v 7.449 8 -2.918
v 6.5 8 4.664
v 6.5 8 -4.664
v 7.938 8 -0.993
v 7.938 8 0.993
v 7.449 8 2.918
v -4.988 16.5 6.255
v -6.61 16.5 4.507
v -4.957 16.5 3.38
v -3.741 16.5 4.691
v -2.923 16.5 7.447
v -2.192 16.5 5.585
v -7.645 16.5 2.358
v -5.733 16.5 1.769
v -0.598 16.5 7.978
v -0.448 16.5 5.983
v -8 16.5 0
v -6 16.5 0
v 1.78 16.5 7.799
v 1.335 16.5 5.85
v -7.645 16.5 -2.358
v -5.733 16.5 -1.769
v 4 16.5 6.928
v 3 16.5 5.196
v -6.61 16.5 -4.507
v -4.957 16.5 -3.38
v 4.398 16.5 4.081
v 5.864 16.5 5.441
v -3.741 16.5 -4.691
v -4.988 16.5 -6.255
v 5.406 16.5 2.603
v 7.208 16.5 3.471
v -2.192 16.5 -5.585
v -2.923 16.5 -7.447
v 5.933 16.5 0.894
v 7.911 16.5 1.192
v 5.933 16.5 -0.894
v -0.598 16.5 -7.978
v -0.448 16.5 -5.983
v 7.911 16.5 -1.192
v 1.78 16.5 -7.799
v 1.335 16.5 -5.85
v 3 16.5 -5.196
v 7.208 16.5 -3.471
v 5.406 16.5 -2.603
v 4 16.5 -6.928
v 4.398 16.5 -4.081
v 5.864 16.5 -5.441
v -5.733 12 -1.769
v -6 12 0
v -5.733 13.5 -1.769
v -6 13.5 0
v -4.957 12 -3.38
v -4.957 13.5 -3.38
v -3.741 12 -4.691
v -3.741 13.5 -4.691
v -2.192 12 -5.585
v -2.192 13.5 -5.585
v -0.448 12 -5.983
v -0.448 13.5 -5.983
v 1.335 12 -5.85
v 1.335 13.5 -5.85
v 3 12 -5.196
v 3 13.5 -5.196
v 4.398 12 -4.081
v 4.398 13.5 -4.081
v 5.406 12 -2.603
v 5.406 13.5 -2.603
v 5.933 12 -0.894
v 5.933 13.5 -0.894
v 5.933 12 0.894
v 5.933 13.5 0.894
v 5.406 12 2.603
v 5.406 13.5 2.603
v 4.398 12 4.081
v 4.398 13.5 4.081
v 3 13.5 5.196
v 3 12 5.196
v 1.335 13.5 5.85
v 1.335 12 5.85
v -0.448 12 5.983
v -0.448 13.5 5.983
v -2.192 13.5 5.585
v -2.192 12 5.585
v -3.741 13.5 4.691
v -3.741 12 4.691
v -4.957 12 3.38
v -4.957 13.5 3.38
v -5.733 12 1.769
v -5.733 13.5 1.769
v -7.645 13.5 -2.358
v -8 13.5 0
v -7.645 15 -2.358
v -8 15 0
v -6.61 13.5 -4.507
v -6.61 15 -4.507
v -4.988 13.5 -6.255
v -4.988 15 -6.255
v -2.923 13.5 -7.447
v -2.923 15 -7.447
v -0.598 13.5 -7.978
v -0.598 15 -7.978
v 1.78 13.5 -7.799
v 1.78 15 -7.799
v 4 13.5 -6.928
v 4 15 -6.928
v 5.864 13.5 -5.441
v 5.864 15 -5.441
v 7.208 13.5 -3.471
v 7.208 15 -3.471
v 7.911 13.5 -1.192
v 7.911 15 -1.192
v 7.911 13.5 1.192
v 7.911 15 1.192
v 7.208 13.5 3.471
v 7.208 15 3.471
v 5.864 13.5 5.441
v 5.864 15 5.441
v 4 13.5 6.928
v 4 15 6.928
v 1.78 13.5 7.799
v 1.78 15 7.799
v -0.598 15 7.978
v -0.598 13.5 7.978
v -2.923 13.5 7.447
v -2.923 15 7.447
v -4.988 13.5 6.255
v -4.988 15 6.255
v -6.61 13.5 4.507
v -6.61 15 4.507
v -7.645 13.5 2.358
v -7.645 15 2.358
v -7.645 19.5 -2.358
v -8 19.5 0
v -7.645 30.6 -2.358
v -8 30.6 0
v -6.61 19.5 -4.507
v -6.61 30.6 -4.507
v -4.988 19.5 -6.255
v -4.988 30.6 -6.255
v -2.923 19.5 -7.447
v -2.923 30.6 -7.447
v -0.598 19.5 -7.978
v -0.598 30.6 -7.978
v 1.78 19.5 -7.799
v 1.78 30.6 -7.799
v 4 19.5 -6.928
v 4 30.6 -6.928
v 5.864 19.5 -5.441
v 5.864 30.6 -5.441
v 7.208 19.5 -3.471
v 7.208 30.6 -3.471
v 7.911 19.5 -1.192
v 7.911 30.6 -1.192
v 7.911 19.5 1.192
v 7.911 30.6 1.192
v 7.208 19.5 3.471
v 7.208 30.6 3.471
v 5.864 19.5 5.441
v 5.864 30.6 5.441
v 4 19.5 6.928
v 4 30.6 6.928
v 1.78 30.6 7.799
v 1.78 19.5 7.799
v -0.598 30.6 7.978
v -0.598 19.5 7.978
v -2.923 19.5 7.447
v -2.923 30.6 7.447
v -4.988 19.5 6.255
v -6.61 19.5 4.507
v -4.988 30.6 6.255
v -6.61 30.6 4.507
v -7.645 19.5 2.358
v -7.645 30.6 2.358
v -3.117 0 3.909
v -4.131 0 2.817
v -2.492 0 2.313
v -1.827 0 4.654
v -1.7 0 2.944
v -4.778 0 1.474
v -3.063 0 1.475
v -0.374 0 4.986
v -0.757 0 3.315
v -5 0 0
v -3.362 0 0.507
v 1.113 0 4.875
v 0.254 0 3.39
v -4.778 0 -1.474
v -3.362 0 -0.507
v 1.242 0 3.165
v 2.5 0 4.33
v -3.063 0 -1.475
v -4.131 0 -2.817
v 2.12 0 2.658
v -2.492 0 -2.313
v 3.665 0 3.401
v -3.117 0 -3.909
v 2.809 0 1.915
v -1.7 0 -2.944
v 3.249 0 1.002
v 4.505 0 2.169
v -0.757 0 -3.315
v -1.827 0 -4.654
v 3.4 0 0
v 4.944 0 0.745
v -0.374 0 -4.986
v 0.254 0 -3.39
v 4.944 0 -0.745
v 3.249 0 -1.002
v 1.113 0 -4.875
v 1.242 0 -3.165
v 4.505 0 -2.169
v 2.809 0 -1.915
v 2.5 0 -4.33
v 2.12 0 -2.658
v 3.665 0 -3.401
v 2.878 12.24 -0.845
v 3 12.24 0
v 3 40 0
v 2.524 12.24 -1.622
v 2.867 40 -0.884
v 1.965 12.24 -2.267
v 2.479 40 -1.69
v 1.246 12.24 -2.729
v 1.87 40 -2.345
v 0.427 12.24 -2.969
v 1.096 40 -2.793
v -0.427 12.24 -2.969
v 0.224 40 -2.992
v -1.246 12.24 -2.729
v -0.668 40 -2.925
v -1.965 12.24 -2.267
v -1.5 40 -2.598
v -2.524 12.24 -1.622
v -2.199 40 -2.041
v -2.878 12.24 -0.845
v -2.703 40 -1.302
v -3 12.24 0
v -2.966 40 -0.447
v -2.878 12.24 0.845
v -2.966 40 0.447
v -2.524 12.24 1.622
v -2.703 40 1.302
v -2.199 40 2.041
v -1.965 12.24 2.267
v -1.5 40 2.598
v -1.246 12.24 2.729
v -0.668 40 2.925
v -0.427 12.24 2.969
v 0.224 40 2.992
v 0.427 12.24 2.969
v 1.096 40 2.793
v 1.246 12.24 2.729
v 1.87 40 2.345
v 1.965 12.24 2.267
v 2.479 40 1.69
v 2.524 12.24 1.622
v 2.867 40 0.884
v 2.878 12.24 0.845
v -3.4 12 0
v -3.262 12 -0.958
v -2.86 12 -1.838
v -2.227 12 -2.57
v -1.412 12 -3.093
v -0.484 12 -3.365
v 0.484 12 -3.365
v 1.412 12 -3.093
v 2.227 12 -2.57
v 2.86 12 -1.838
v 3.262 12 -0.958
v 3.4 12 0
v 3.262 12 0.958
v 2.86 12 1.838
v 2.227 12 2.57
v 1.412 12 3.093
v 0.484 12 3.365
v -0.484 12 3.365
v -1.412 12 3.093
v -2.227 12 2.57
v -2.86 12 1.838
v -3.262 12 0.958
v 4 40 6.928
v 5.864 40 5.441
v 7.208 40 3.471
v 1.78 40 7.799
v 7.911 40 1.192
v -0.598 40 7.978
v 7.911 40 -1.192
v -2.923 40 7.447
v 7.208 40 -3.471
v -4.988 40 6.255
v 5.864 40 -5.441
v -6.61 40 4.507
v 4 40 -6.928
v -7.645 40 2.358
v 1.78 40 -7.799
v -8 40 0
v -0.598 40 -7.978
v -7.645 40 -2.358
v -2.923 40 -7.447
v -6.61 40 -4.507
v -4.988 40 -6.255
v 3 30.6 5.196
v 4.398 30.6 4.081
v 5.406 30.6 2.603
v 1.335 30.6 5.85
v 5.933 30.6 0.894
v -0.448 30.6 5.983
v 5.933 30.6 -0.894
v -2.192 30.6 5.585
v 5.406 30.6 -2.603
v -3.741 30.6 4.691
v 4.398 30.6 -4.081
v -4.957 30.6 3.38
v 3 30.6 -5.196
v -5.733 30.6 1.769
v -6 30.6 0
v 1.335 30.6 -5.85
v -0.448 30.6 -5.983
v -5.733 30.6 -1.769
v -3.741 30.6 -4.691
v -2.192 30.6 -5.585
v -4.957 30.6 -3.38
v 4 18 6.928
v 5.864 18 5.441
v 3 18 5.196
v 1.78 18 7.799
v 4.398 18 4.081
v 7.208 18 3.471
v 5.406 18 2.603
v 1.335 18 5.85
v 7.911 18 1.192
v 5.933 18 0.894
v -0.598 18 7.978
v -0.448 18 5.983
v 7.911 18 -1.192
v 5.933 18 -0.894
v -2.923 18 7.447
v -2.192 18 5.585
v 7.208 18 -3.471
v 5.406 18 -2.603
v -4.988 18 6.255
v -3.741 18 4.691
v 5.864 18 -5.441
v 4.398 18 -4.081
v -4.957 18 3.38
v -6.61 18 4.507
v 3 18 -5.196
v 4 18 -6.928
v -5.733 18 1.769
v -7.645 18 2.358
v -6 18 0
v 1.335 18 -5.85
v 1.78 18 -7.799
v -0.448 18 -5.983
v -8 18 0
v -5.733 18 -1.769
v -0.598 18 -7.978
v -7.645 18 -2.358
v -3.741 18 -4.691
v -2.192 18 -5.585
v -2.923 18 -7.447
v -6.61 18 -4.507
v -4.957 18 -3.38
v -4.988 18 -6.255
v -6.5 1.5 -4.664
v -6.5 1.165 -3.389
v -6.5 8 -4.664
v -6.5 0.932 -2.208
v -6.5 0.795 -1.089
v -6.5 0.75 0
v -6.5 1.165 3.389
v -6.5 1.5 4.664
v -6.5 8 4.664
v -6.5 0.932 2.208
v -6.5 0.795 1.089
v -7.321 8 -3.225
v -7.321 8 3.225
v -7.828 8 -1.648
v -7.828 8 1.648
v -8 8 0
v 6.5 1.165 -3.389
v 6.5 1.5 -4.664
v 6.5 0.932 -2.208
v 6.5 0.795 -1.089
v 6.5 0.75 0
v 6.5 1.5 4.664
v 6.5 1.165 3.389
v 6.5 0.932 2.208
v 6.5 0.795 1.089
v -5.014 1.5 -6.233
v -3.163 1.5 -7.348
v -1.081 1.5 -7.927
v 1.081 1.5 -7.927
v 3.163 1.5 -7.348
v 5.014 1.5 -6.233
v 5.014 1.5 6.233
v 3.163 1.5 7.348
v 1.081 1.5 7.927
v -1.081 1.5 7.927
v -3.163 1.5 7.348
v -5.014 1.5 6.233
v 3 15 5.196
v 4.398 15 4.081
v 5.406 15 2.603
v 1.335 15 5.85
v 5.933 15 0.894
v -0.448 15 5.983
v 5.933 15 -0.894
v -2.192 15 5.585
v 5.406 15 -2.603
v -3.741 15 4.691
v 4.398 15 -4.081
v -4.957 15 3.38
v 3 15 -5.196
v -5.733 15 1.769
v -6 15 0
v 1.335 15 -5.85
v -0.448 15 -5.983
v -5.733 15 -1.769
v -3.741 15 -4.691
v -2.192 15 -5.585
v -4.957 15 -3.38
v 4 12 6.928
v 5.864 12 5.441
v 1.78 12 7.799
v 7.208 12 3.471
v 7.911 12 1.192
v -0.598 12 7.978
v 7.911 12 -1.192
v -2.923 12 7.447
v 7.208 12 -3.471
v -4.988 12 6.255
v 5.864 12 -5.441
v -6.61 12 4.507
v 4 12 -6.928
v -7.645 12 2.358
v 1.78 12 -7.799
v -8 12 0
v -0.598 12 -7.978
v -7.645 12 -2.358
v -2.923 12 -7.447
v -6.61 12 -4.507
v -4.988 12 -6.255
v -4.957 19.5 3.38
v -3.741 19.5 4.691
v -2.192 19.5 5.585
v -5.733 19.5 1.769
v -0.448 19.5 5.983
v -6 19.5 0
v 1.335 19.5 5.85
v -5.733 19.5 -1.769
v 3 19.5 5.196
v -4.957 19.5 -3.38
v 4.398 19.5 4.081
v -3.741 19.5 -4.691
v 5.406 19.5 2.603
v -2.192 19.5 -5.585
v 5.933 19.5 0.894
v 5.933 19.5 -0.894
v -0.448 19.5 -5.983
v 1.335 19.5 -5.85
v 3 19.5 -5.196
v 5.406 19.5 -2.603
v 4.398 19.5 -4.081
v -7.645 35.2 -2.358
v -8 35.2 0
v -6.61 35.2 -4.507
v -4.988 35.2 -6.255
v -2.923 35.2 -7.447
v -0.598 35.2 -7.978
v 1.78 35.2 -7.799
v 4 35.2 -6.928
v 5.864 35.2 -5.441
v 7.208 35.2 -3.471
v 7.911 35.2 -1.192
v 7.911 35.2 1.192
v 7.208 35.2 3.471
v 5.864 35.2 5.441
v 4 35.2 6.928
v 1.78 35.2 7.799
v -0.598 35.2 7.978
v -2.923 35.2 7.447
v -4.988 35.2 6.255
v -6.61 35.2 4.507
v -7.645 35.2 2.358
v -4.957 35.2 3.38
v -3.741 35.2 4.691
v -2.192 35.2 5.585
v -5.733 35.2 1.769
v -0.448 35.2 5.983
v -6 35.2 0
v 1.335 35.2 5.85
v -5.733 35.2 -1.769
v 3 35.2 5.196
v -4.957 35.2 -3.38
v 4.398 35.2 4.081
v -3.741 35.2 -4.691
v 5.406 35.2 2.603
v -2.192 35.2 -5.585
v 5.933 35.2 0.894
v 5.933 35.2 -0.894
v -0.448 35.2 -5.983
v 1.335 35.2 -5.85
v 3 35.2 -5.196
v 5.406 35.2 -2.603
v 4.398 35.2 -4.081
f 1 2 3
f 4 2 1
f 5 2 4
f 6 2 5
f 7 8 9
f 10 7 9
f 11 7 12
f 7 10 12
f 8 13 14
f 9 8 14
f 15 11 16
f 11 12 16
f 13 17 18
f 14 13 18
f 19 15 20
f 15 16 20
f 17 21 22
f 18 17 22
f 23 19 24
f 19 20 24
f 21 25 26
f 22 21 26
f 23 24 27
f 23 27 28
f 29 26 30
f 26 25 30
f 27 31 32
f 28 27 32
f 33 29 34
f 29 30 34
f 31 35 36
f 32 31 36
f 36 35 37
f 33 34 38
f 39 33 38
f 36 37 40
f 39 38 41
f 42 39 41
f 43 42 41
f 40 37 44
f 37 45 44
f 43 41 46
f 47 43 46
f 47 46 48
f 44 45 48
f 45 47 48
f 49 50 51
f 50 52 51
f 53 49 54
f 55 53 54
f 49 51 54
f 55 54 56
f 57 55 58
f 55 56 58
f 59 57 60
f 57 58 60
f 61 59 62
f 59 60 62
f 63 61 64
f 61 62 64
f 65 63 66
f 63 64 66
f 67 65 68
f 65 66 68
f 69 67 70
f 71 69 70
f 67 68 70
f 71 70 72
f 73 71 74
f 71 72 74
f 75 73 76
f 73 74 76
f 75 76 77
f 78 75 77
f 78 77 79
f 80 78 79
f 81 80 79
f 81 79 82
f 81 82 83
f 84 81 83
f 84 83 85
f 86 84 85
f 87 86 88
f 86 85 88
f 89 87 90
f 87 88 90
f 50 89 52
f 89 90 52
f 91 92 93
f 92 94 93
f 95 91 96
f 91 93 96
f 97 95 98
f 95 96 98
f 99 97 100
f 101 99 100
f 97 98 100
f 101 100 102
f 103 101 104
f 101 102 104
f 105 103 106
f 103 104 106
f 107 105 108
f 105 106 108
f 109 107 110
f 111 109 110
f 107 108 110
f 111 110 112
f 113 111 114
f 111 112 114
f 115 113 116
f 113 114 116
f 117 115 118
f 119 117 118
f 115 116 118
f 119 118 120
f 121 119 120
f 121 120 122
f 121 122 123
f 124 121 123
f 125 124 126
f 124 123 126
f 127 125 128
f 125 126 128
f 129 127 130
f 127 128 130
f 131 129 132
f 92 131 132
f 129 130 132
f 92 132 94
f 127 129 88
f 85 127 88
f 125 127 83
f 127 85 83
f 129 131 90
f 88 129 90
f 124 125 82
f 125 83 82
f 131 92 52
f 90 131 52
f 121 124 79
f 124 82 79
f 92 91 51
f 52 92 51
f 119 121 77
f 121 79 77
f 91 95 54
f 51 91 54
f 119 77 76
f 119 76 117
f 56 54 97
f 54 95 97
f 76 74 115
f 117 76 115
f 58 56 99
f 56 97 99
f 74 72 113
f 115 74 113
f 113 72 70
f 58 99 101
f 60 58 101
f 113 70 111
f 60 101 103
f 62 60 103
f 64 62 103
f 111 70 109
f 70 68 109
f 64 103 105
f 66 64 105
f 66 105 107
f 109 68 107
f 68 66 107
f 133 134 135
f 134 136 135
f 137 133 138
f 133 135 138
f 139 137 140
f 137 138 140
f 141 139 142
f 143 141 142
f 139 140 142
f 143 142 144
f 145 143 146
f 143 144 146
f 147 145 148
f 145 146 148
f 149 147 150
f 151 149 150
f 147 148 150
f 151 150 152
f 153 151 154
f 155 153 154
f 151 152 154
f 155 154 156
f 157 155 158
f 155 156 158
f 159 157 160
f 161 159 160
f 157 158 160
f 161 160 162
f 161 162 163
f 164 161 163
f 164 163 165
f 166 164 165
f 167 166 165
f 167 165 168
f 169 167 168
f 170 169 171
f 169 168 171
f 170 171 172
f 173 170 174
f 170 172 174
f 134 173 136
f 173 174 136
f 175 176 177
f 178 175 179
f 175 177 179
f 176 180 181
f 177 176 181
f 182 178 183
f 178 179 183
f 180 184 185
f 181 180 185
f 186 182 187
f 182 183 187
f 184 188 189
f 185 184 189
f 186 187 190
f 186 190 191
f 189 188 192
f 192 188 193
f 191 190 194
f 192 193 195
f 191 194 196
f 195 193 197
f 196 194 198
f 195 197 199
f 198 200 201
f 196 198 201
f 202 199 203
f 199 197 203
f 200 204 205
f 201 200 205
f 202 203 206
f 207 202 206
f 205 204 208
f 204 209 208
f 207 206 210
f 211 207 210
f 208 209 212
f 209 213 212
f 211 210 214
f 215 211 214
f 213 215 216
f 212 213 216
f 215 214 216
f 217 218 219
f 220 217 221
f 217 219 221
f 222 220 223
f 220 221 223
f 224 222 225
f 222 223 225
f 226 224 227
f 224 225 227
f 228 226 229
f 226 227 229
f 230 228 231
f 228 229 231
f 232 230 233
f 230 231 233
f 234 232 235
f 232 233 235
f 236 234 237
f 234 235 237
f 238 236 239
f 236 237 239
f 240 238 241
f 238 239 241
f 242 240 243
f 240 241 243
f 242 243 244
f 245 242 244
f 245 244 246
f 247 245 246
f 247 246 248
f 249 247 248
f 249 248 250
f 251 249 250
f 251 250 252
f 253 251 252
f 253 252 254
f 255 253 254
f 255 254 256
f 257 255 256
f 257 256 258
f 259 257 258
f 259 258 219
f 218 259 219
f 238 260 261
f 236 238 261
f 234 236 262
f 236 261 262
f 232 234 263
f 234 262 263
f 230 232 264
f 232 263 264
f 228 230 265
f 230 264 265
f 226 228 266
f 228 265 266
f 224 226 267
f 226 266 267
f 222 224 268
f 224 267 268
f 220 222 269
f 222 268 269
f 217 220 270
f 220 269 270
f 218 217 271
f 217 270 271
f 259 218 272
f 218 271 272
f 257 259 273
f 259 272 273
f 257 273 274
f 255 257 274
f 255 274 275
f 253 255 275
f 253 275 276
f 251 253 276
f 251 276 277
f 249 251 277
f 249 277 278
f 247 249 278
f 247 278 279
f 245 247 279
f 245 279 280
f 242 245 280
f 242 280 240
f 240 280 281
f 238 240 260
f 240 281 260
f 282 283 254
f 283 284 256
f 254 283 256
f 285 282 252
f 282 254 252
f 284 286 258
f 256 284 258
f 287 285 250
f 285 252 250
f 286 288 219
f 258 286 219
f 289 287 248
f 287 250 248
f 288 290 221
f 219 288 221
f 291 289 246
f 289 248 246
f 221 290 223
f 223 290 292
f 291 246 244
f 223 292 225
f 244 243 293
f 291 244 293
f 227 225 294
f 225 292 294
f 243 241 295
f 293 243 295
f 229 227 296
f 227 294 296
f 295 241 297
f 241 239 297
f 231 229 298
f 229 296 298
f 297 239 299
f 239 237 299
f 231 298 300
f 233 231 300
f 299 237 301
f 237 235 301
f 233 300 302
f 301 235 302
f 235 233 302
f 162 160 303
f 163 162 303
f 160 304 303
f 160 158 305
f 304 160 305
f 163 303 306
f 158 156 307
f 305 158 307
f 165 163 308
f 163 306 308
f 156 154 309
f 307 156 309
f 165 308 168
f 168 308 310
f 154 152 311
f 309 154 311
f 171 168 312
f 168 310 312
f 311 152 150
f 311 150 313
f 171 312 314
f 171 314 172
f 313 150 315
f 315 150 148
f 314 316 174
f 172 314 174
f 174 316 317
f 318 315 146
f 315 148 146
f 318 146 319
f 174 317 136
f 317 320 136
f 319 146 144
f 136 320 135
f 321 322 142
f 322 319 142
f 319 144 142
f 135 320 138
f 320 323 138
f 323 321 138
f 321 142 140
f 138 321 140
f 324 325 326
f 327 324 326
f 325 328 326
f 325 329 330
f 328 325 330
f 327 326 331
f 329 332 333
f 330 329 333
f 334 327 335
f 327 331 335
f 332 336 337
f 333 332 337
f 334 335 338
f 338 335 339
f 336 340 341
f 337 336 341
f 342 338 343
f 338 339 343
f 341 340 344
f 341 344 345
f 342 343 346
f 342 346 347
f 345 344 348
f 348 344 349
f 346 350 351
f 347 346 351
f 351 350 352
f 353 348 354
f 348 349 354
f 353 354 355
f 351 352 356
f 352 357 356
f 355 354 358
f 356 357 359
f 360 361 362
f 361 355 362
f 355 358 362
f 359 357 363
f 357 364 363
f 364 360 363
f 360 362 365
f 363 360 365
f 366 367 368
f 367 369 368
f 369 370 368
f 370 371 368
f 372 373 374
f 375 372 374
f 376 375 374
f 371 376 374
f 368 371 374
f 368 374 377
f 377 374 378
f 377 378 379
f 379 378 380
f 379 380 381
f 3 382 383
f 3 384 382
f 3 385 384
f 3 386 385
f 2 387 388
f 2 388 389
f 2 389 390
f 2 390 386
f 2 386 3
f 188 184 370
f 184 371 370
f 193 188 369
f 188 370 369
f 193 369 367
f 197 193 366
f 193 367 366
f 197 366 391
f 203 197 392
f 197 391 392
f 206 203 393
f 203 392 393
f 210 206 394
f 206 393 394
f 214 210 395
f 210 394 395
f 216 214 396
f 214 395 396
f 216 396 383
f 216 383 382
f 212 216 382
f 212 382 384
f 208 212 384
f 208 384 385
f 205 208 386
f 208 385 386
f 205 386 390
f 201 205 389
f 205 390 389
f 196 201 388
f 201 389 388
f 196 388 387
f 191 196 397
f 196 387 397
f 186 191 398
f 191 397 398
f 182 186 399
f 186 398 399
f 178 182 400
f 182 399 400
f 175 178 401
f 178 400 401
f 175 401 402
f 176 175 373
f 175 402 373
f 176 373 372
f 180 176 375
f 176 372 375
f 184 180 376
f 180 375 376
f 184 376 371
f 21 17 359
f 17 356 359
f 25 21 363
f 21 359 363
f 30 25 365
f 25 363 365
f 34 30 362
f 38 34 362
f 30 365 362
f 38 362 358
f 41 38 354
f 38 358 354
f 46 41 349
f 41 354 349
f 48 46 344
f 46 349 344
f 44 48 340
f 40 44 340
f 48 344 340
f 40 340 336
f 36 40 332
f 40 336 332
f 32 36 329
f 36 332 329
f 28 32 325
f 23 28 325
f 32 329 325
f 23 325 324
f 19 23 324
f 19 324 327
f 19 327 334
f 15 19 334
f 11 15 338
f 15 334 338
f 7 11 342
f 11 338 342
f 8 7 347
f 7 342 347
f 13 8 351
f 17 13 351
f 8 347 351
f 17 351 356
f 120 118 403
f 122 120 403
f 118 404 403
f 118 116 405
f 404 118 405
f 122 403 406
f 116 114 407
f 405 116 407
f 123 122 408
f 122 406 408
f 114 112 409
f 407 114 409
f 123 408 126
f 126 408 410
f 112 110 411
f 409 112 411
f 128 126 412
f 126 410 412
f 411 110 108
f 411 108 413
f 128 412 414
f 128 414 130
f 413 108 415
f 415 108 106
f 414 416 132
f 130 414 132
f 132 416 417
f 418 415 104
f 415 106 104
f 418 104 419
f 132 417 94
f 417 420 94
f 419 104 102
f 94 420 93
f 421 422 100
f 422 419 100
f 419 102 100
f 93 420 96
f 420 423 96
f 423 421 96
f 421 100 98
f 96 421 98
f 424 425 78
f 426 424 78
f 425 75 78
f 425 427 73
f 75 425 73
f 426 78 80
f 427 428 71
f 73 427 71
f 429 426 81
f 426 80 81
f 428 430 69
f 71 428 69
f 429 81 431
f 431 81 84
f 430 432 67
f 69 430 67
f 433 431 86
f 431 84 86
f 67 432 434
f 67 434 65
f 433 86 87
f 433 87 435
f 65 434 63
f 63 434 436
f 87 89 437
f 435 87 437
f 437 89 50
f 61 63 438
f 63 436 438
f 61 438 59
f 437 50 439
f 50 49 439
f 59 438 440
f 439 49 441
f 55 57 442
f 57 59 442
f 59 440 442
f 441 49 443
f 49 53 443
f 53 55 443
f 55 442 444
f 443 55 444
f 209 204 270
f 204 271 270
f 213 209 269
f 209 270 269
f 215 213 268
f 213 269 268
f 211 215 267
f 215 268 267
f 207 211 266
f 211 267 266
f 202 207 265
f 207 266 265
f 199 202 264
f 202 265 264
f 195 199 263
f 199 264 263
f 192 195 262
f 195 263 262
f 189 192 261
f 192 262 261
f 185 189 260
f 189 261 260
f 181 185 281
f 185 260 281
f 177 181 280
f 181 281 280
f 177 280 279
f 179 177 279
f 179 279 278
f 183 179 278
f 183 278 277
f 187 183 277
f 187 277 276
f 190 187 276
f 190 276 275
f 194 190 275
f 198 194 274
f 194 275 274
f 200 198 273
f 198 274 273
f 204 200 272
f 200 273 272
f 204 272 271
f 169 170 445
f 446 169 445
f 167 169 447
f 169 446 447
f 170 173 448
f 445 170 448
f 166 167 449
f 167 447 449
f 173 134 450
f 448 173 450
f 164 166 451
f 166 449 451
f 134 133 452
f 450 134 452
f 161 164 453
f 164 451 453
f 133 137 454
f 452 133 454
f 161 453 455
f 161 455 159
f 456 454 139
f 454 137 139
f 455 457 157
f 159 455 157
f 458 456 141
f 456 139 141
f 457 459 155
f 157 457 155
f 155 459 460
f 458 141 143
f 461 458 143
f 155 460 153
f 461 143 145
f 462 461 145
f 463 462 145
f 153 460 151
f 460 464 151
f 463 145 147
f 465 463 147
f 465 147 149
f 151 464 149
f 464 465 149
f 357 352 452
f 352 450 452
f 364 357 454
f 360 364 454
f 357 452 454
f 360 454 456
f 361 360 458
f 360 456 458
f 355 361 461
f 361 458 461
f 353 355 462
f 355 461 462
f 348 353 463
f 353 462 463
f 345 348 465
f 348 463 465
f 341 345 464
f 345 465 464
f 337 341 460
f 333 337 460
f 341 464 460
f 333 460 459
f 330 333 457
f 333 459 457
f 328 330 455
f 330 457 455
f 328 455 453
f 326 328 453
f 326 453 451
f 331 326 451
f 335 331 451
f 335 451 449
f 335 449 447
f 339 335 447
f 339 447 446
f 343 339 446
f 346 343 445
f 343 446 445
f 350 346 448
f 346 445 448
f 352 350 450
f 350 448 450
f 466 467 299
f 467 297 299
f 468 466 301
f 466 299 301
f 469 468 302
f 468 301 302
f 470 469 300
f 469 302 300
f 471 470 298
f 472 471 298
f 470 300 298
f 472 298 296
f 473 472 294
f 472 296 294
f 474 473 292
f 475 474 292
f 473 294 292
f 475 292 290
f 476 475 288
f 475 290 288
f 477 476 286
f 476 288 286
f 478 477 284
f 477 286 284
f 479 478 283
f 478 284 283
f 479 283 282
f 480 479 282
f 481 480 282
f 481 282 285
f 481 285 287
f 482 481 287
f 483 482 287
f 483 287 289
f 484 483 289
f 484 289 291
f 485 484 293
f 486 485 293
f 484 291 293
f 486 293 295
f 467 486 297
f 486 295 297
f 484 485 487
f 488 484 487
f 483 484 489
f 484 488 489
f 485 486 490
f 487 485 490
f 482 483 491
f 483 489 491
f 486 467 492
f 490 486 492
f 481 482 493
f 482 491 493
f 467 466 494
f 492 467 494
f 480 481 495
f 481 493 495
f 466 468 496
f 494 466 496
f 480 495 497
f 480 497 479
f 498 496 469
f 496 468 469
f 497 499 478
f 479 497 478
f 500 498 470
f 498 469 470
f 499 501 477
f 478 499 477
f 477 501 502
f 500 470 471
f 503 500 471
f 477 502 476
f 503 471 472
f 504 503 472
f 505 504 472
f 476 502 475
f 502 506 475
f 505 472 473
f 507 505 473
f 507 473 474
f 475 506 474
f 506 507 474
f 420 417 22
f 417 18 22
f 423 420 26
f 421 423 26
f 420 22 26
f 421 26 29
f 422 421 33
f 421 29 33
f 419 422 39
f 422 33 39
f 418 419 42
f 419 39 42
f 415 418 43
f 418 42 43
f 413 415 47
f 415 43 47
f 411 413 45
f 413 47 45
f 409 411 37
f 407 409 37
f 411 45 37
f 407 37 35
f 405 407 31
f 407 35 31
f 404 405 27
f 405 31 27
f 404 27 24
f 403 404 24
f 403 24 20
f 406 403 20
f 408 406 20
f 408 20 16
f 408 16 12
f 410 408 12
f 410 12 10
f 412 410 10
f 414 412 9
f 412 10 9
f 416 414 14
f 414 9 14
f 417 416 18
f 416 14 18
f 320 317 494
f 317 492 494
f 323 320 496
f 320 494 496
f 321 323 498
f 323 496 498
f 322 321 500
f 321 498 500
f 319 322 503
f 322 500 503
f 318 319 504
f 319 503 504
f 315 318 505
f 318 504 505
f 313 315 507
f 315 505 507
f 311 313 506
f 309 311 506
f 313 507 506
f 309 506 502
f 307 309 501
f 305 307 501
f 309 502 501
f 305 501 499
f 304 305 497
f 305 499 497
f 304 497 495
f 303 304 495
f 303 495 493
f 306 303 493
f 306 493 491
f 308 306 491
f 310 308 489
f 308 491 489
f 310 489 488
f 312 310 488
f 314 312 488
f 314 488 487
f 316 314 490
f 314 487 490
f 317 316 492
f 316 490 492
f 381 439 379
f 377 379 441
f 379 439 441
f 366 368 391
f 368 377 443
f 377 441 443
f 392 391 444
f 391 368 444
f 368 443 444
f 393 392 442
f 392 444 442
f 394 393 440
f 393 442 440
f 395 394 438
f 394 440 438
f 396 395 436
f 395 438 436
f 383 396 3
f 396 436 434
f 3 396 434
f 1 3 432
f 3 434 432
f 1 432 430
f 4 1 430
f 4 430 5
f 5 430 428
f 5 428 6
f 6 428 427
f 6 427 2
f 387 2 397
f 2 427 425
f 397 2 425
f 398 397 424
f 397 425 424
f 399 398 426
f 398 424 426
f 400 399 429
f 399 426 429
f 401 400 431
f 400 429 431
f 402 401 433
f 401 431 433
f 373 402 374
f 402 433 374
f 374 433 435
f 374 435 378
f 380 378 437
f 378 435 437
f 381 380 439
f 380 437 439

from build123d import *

# Parameters (mm, degrees)
TAGLIO_ESTRUSIONE1_REACH             = 10
SCHIZZO2_W                           = 1.5
SCHIZZO2_H                           = 8
TAGLIO_ESTRUSIONE1_DIRECTION_2_REACH = 10
SCHIZZO7_R                           = 3
TAGLIO_ESTRUSIONE2_DEPTH             = 41
FORO_FILETTATO_M8_1_D                = 6.8
FORO_FILETTATO_M8_1_DEPTH            = 12
FORO_FILETTATO_M8_1_TIP              = 2.042926105


with BuildPart() as part:
    # Schizzo1 → Rivoluzione1 (revolve)
    with BuildSketch(Plane.XY):
        Polygon((0, 0), (-5, 0), (-8, 1.5), (-8, 12), (-6, 12), (-6, 13.5), (-8, 13.5), (-8, 15), (-6, 15), (-6, 16.5), (-8, 16.5), (-8, 18), (-6, 18), (-6, 19.5), (-8, 19.5), (-8, 30.6), (-6, 30.6), (-6, 35.2), (-8, 35.2), (-8, 40), (0, 40), align=None)
    revolve(axis=Axis((0, 129.407380346, 0), (0, -1, 0)))

    # Schizzo2 → Taglio-Estrusione1 (cut, up to next)
    with BuildSketch(Plane.XY, mode=Mode.PRIVATE) as taglio_estrusione1_sk1:
        with Locations((-7.25, 4)):
            Rectangle(SCHIZZO2_W, SCHIZZO2_H)
    taglio_estrusione1_tool1 = extrude(taglio_estrusione1_sk1.sketch, amount=-TAGLIO_ESTRUSIONE1_REACH, mode=Mode.PRIVATE) & part.part
    add(taglio_estrusione1_tool1.solids().sort_by_distance((-7.25, 4, 0))[0], mode=Mode.SUBTRACT)
    # Schizzo2 → Taglio-Estrusione1 (cut, up to next)
    with BuildSketch(Plane.XY, mode=Mode.PRIVATE) as taglio_estrusione1_sk2:
        with Locations((7.25, 4)):
            Rectangle(SCHIZZO2_W, SCHIZZO2_H)
    taglio_estrusione1_tool2 = extrude(taglio_estrusione1_sk2.sketch, amount=-TAGLIO_ESTRUSIONE1_REACH, mode=Mode.PRIVATE) & part.part
    add(taglio_estrusione1_tool2.solids().sort_by_distance((7.25, 4, 0))[0], mode=Mode.SUBTRACT)

    # Schizzo2 → Taglio-Estrusione1 direction 2 (cut, up to next)
    with BuildSketch(Plane.XY, mode=Mode.PRIVATE) as taglio_estrusione1_direction_2_sk1:
        with Locations((-7.25, 4)):
            Rectangle(SCHIZZO2_W, SCHIZZO2_H)
    taglio_estrusione1_direction_2_tool1 = extrude(taglio_estrusione1_direction_2_sk1.sketch, amount=TAGLIO_ESTRUSIONE1_DIRECTION_2_REACH, mode=Mode.PRIVATE) & part.part
    add(taglio_estrusione1_direction_2_tool1.solids().sort_by_distance((-7.25, 4, 0))[0], mode=Mode.SUBTRACT)
    # Schizzo2 → Taglio-Estrusione1 direction 2 (cut, up to next)
    with BuildSketch(Plane.XY, mode=Mode.PRIVATE) as taglio_estrusione1_direction_2_sk2:
        with Locations((7.25, 4)):
            Rectangle(SCHIZZO2_W, SCHIZZO2_H)
    taglio_estrusione1_direction_2_tool2 = extrude(taglio_estrusione1_direction_2_sk2.sketch, amount=TAGLIO_ESTRUSIONE1_DIRECTION_2_REACH, mode=Mode.PRIVATE) & part.part
    add(taglio_estrusione1_direction_2_tool2.solids().sort_by_distance((7.25, 4, 0))[0], mode=Mode.SUBTRACT)

    # Schizzo7 → Taglio-Estrusione2 (cut, through all)
    with BuildSketch(Plane(origin=(0, 40, 0), x_dir=(1, 0, 0), z_dir=(0, 1, 0))):
        Circle(SCHIZZO7_R)
    extrude(amount=-TAGLIO_ESTRUSIONE2_DEPTH, mode=Mode.SUBTRACT)

    # Foro filettato M8-1
    with Locations(Plane(origin=(0, 0, 0), x_dir=(-1, 0, 0), z_dir=(0, -1, 0))):
        with Locations((0, 0)):
            Hole(FORO_FILETTATO_M8_1_D / 2, depth=FORO_FILETTATO_M8_1_DEPTH)
            with Locations((0, 0, -(FORO_FILETTATO_M8_1_DEPTH + FORO_FILETTATO_M8_1_TIP / 2))):  # 118° drill point
                Cone(0, FORO_FILETTATO_M8_1_D / 2, FORO_FILETTATO_M8_1_TIP, mode=Mode.SUBTRACT)


solid = part.part
